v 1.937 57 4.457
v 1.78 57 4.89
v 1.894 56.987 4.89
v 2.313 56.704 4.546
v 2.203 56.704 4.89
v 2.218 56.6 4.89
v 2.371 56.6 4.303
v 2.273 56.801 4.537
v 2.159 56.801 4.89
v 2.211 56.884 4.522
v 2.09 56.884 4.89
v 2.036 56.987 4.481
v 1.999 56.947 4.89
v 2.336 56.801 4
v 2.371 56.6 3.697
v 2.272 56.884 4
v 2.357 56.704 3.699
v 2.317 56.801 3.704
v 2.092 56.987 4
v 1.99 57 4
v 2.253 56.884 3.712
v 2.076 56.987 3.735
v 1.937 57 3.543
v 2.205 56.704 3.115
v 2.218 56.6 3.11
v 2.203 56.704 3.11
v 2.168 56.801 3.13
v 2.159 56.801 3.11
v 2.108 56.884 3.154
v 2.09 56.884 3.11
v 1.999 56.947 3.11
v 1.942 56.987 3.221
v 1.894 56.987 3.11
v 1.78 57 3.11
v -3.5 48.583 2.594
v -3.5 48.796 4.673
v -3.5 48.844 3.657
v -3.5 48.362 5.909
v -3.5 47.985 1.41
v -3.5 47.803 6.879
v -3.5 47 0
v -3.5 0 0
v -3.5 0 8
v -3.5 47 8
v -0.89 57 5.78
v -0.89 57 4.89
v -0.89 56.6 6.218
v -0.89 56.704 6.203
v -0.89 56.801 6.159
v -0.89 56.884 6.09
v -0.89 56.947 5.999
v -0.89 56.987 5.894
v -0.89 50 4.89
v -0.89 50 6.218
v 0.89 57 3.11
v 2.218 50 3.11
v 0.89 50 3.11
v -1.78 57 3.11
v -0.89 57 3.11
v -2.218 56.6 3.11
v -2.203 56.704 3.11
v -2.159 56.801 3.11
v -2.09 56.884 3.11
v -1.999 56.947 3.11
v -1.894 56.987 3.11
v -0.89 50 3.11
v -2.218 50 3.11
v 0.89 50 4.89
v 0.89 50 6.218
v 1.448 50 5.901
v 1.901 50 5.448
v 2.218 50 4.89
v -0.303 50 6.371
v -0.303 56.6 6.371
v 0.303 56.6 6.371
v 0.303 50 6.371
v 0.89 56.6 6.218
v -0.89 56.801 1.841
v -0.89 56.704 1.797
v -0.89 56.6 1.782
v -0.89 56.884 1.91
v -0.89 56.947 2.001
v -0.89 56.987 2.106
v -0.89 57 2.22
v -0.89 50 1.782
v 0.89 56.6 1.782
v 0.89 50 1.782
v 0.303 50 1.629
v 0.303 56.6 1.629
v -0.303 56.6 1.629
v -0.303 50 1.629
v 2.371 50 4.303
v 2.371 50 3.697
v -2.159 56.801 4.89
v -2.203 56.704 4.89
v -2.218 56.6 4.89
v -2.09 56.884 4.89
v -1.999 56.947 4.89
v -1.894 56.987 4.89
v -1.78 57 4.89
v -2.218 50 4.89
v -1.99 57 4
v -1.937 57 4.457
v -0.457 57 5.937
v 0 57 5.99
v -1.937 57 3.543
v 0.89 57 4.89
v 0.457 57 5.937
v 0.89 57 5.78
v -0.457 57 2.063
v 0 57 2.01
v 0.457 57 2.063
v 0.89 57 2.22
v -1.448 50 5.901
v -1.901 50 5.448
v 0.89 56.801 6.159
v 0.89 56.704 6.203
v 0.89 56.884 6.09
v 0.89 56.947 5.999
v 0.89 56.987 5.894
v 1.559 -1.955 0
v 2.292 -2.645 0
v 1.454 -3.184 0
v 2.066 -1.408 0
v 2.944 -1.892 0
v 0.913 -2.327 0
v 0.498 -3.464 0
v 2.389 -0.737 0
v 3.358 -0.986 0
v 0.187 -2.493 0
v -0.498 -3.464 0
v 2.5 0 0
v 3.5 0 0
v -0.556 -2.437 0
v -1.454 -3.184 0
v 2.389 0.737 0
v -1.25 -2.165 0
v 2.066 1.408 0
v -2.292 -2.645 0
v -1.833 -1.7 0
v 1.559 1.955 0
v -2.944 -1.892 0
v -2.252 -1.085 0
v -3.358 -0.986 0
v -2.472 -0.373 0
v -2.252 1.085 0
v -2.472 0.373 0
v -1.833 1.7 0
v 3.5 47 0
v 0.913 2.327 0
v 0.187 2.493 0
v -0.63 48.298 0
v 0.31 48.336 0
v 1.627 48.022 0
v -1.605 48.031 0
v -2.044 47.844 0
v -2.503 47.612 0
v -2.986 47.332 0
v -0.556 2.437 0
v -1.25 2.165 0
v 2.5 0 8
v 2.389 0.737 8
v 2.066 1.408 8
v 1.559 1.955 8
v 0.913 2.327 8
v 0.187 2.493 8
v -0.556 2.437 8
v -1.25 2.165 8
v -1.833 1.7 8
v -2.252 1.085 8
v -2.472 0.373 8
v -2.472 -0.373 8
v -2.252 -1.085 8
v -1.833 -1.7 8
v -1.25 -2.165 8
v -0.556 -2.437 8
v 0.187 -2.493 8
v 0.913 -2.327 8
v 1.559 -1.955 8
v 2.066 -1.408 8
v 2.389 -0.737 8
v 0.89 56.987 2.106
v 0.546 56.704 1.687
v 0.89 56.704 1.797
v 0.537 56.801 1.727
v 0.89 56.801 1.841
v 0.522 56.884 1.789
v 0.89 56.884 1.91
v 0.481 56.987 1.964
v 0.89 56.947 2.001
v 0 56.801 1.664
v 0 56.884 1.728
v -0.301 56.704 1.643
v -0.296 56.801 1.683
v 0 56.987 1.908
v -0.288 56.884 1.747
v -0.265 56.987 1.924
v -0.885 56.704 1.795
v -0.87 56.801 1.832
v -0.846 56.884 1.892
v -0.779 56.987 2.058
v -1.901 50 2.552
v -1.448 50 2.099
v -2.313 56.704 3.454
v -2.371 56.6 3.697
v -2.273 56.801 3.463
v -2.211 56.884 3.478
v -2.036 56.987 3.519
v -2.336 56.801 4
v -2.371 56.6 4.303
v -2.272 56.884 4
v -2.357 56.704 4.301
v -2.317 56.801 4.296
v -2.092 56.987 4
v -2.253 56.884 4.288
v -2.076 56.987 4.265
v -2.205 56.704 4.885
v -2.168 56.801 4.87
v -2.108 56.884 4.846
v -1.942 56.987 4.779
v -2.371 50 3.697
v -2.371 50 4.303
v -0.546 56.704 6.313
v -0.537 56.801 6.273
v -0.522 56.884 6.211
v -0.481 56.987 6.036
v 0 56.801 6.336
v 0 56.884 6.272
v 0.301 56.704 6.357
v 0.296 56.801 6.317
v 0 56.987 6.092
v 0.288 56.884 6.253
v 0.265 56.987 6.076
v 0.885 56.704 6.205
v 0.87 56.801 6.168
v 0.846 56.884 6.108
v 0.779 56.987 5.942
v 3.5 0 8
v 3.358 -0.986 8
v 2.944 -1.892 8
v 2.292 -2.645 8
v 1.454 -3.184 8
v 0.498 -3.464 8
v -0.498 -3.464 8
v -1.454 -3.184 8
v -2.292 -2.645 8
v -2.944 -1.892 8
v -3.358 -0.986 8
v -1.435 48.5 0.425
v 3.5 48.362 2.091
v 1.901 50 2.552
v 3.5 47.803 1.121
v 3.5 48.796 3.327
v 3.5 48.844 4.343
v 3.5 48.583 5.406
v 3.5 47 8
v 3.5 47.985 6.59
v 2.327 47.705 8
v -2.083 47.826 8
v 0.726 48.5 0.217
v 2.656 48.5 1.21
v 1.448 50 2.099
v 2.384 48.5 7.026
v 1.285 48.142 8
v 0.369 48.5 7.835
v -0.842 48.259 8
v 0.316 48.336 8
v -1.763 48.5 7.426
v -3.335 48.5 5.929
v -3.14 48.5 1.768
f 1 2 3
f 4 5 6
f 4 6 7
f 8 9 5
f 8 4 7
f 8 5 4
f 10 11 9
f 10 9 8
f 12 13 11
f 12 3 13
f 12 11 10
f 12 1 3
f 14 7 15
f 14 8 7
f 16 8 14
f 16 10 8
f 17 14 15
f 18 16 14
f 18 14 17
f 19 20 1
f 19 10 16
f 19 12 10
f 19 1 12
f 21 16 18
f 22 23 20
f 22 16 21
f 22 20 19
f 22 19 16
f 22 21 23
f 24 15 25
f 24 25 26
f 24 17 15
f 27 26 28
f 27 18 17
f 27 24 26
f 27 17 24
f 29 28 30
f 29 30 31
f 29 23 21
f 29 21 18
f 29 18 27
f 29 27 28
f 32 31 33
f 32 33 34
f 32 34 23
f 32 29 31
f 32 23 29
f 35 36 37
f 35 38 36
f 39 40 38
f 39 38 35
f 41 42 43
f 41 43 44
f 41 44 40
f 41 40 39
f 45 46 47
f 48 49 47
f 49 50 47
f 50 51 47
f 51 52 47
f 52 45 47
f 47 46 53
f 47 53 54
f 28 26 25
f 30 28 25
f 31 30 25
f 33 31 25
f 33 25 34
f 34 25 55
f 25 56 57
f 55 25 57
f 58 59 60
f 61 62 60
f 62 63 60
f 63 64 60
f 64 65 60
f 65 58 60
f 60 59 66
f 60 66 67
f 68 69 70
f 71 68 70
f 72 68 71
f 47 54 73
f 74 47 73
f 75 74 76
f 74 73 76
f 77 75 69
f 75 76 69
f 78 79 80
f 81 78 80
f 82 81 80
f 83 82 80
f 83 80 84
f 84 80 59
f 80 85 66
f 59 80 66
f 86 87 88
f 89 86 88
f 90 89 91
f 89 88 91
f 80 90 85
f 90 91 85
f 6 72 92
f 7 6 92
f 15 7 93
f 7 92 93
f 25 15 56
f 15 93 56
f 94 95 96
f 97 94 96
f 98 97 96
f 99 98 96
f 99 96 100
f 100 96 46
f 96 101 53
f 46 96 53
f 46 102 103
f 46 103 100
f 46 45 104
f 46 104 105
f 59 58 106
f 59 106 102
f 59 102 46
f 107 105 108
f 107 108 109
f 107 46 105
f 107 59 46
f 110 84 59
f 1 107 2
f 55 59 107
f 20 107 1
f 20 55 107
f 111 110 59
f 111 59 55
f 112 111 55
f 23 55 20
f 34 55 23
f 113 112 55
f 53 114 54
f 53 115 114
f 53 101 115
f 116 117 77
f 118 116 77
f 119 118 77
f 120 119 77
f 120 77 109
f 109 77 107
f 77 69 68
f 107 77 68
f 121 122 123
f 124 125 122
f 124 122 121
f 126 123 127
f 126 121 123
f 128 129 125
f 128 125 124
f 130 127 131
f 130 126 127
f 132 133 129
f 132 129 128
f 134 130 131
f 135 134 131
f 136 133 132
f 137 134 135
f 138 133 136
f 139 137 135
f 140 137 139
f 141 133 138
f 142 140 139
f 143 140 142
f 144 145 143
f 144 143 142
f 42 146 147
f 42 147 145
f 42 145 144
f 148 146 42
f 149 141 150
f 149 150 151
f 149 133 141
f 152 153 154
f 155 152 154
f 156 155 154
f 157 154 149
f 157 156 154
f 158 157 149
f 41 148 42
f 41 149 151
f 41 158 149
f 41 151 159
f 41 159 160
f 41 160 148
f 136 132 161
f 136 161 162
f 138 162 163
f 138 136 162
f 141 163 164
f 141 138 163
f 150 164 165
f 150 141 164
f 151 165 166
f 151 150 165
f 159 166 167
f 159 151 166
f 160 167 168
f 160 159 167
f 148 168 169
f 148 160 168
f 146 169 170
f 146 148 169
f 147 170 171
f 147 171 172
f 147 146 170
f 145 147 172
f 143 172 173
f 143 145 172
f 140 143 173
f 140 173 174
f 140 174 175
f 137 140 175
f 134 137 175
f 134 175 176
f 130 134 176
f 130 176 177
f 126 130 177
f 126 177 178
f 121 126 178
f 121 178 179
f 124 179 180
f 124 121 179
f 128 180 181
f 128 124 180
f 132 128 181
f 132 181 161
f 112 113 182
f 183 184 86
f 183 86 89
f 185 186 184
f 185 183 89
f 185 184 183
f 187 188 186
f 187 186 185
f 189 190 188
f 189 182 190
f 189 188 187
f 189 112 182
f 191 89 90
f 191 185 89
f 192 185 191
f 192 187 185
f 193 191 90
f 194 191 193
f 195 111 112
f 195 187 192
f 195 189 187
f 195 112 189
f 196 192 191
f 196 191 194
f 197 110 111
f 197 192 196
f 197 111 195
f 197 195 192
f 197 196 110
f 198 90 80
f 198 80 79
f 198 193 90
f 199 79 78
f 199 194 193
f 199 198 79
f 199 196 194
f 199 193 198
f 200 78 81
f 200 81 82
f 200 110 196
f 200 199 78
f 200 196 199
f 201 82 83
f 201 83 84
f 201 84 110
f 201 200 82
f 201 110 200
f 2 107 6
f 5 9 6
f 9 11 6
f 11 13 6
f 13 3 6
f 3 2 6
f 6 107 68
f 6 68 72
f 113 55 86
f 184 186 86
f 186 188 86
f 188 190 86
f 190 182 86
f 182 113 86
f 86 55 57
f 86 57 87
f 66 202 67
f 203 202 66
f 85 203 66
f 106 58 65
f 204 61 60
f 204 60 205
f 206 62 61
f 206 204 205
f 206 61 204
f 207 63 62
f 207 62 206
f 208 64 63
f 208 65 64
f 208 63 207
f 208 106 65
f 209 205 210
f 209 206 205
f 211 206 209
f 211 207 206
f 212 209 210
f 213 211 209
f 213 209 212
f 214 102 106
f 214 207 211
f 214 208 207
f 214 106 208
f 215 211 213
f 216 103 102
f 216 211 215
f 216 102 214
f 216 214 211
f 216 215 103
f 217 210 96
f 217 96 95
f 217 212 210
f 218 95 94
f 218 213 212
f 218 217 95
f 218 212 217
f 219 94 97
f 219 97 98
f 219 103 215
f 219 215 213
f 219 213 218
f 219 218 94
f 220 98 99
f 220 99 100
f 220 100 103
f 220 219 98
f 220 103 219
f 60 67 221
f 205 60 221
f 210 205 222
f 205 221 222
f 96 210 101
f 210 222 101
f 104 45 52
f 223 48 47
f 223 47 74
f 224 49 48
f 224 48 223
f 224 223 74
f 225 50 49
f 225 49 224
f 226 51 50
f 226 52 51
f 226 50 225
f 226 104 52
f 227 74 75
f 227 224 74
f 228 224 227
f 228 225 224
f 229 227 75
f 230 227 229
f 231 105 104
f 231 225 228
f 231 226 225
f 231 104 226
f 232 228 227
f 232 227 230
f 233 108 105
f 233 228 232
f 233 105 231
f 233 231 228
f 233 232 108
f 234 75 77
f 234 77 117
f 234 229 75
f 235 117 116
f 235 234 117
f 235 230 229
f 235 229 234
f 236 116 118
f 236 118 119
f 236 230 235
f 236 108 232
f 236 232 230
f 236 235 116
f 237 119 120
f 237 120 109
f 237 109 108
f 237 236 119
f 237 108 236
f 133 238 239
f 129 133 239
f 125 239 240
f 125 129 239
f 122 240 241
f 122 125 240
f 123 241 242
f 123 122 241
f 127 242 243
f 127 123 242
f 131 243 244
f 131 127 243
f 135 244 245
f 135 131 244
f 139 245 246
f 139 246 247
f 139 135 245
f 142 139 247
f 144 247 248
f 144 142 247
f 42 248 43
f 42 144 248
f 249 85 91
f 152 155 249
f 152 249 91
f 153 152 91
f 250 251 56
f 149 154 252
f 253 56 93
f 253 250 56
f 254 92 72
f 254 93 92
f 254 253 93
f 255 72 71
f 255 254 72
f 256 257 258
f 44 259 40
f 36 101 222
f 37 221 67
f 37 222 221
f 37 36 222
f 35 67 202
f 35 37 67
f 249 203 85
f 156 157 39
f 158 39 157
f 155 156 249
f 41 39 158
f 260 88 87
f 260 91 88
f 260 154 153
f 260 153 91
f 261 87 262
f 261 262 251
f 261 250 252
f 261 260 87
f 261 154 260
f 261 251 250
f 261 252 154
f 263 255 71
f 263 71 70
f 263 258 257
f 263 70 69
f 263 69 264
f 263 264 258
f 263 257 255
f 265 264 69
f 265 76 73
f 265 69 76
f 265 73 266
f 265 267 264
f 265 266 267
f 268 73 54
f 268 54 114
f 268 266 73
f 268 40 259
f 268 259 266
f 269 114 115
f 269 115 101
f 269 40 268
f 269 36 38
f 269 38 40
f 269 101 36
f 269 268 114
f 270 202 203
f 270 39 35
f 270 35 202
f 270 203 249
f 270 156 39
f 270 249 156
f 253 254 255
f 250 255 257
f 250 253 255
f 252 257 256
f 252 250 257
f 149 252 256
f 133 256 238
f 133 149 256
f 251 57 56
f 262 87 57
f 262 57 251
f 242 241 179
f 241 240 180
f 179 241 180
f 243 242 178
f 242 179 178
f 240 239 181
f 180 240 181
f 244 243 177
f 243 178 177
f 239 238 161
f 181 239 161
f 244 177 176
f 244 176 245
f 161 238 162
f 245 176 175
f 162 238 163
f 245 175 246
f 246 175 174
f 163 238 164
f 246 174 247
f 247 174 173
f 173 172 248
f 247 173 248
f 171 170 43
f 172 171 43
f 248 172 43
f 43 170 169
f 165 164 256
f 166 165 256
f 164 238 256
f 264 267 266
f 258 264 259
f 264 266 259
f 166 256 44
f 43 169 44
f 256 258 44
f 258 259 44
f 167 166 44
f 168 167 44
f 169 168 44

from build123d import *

# Parameters (mm, degrees)
SKETCH_1_R      = 2.5
EXTRUDE_1_DEPTH = 8
EXTRUDE_3_DEPTH = 7
FILLET_1_R      = 0.4


with BuildPart() as part:
    # ｽｹｯﾁ1 → ﾎﾞｽ - 押し出し1 (new body)
    with BuildSketch(Plane.XY):
        with BuildLine():
            Line((-3.5, 0), (-3.5, 50))
            Line((-3.5, 50), (3.5, 50))
            Line((3.5, 50), (3.5, 0))
            ThreePointArc((3.5, 0), (0, -3.5), (-3.5, 0))
        make_face()
        Circle(SKETCH_1_R, mode=Mode.SUBTRACT)
    extrude(amount=EXTRUDE_1_DEPTH)

    # ｽｹｯﾁ2 → ﾎﾞｽ - 押し出し3 (add)
    with BuildSketch(Plane(origin=(0, 50, 0), x_dir=(1, 0, 0), z_dir=(0, 1, 0))):
        with BuildLine():
            Line((-0.89, -1.781892699), (-0.89, -3.11))
            Line((-0.89, -3.11), (-2.218107301, -3.11))
            ThreePointArc((-2.218107301, -3.11), (-2.39, -4), (-2.218107301, -4.89))
            Line((-2.218107301, -4.89), (-0.89, -4.89))
            Line((-0.89, -4.89), (-0.89, -6.218107301))
            ThreePointArc((-0.89, -6.218107301), (0, -6.39), (0.89, -6.218107301))
            Line((0.89, -6.218107301), (0.89, -4.89))
            Line((0.89, -4.89), (2.218107301, -4.89))
            ThreePointArc((2.218107301, -4.89), (2.39, -4), (2.218107301, -3.11))
            Line((2.218107301, -3.11), (0.89, -3.11))
            Line((0.89, -3.11), (0.89, -1.781892699))
            ThreePointArc((0.89, -1.781892699), (0, -1.61), (-0.89, -1.781892699))
        make_face()
    extrude(amount=EXTRUDE_3_DEPTH)

    # ﾌｨﾚｯﾄ1
    fillet_1_edges = [part.edges().sort_by_distance(p)[0] for p in [
        (0, 57, 1.61),
        (-2.39, 57, 4),
        (0, 57, 6.39),
        (2.39, 57, 4),
    ]]
    fillet(fillet_1_edges, radius=FILLET_1_R)

    # ｽｹｯﾁ5 → ｶｯﾄ - 回転2 (revolve, cut)
    with BuildSketch(Plane(origin=(-1.982300885, 0, 1.734513274), x_dir=(0.6585046078685183, 0, 0.7525766947068778), z_dir=(-0.7525766947068777, 0, 0.6585046078685182)), mode=Mode.PRIVATE) as cut_revolve_2_sk:
        Polygon((0.620306779, 50), (-2.304766128, 47), (-2.304766128, 50), align=None)
    revolve(cut_revolve_2_sk.sketch.rotate(Axis((0, 57, 4), (0, -1, 0)), 19.323147236), axis=Axis((0, 57, 4), (0, -1, 0)), mode=Mode.SUBTRACT)


solid = part.part
